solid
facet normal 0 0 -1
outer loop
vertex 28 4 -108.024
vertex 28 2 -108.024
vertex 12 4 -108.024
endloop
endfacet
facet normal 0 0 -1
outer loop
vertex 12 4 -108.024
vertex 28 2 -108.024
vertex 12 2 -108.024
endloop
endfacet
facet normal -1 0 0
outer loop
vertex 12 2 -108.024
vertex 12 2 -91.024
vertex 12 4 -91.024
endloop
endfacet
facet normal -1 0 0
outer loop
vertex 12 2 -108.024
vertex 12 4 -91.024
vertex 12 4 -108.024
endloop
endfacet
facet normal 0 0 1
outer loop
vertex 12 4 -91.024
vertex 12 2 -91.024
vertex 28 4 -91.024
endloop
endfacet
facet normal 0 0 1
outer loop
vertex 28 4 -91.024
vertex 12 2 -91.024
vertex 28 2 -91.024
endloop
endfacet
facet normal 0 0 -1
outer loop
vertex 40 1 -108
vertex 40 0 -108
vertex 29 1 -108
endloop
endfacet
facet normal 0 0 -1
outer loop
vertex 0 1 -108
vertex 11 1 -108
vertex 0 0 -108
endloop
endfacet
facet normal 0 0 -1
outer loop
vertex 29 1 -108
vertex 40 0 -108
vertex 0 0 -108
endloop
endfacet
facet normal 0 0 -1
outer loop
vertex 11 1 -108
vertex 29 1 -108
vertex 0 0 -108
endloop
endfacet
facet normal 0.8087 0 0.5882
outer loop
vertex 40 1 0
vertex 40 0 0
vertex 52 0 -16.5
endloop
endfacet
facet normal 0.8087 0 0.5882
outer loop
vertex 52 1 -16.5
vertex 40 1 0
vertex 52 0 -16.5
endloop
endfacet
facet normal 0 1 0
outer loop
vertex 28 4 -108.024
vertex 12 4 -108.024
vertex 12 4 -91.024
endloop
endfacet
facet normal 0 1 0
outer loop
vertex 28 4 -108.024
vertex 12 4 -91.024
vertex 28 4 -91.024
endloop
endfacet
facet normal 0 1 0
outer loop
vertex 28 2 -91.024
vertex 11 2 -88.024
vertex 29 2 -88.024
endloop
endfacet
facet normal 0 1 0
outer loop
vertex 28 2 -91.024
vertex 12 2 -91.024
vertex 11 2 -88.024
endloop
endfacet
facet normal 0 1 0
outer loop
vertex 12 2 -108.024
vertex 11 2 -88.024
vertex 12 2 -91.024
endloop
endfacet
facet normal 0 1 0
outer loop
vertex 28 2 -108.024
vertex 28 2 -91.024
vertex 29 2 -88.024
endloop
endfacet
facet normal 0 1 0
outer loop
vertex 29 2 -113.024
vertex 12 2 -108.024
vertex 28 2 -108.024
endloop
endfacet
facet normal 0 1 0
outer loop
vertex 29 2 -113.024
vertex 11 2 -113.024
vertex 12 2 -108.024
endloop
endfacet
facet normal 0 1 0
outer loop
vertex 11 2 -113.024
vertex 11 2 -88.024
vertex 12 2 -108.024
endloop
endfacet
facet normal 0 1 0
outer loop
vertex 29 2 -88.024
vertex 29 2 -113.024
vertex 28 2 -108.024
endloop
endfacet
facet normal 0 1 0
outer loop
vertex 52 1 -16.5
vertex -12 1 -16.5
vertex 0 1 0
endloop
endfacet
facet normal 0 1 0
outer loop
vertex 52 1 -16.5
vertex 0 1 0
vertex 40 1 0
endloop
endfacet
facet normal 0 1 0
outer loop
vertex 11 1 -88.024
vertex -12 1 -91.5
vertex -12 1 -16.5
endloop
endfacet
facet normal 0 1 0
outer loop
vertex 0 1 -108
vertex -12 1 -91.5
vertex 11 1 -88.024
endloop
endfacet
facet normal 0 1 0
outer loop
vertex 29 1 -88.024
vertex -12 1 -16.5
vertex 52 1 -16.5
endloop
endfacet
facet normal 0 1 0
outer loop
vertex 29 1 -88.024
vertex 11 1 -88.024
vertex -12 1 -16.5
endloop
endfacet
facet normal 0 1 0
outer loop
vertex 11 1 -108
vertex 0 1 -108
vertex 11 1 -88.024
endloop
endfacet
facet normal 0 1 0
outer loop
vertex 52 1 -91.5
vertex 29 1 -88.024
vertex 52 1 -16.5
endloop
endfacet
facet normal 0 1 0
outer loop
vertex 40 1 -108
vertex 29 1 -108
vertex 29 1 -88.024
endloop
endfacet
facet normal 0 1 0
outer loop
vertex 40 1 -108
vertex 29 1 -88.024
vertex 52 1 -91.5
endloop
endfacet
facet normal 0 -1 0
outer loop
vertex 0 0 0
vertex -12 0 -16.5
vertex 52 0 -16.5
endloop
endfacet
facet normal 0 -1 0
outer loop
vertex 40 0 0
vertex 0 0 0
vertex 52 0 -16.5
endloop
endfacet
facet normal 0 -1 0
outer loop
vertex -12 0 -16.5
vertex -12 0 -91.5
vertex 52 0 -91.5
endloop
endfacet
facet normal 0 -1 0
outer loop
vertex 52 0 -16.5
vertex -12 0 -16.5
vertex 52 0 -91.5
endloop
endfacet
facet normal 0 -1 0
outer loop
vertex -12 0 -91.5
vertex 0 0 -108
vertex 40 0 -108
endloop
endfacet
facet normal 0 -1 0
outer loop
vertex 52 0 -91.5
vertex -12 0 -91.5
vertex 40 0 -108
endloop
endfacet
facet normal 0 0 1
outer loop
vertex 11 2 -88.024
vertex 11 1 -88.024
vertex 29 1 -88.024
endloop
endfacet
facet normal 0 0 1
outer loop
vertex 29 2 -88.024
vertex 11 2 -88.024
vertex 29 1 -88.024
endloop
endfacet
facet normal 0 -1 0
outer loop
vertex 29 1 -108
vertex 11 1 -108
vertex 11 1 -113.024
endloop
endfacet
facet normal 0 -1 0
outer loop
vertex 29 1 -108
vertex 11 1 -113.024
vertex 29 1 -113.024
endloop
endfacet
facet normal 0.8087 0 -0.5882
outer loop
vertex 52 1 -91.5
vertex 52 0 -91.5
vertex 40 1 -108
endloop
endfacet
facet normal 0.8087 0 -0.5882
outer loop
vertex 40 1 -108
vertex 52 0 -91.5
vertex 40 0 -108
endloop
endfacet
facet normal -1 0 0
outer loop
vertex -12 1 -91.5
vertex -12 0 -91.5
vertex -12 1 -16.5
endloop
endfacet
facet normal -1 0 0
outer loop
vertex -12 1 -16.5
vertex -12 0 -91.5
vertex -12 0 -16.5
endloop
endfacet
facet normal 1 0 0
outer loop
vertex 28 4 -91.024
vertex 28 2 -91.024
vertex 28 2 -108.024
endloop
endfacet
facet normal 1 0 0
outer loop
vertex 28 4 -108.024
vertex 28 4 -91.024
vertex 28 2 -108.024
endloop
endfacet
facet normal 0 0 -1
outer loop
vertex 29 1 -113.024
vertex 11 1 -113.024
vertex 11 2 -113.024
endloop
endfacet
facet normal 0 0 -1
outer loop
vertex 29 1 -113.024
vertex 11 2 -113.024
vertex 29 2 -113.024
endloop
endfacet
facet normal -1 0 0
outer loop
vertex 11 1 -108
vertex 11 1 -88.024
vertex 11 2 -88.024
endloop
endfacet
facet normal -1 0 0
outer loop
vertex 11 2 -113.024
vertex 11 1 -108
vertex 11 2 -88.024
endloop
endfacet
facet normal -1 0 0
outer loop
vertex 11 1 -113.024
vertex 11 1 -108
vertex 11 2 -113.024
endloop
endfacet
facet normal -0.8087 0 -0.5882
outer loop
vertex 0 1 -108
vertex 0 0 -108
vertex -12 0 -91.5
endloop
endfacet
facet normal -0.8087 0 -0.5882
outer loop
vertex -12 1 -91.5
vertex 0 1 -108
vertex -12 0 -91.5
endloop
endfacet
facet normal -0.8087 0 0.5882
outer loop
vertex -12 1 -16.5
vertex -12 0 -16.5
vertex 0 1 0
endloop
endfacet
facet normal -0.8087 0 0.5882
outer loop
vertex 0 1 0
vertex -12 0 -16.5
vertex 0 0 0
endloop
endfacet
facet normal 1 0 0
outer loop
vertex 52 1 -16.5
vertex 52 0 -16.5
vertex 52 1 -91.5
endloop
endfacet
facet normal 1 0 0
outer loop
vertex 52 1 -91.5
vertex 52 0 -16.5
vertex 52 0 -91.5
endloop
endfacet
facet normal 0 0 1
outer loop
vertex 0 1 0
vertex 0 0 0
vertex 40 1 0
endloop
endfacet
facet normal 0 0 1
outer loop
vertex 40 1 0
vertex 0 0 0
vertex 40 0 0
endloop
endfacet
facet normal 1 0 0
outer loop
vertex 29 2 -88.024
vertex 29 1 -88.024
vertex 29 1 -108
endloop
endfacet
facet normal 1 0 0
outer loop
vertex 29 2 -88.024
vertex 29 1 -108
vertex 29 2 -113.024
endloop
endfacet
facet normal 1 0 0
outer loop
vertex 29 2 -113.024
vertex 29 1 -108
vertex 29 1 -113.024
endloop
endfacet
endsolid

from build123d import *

# Parameters (mm, degrees)
BOSS_EXTRUDE3_DEPTH = 1
SKETCH5_W           = 8
SKETCH5_H           = 17
BOSS_EXTRUDE4_DEPTH = 3
SKETCH6_W           = 18
SKETCH6_H           = 25
BOSS_EXTRUDE5_DEPTH = 1
SKETCH7_W           = 18
SKETCH7_H           = 5.023609272
CUT_EXTRUDE4_DEPTH  = 1


with BuildPart() as part:
    # Sketch1 → Boss-Extrude3 (new body)
    with BuildSketch(Plane(origin=(0, 0, 0), x_dir=(1, 0, 0), z_dir=(0, 1, 0))):
        Polygon((-12, 54), (20, 54), (20, 108), (11, 108), (0, 108), (-12, 91.5), align=None)
        Polygon((20, 108), (20, 54), (52, 54), (52, 91.5), (40, 108), (29, 108), align=None)
        Polygon((-12, 16.5), (0, 0), (20, 0), (20, 54), (-12, 54), align=None)
        Polygon((20, 54), (20, 0), (40, 0), (52, 16.5), (52, 54), align=None)
        Polygon((11, 108), (20, 108), (29, 108), (29, 113.023609272), (11, 113.023609272), align=None)
    extrude(amount=BOSS_EXTRUDE3_DEPTH)

    # Sketch5 → Boss-Extrude4 (add)
    with BuildSketch(Plane(origin=(0, 1, 0), x_dir=(1, 0, 0), z_dir=(0, 1, 0))):
        with Locations((16, 99.523609272)):
            Rectangle(SKETCH5_W, SKETCH5_H)
        with Locations((24, 99.523609272)):
            Rectangle(SKETCH5_W, SKETCH5_H)
    extrude(amount=BOSS_EXTRUDE4_DEPTH)

    # Sketch6 → Boss-Extrude5 (add)
    with BuildSketch(Plane(origin=(0, 1, 0), x_dir=(1, 0, 0), z_dir=(0, 1, 0))):
        with Locations((20, 100.523609272)):
            Rectangle(SKETCH6_W, SKETCH6_H)
    extrude(amount=BOSS_EXTRUDE5_DEPTH)

    # Sketch7 → Cut-Extrude4 (cut)
    with BuildSketch(Plane.XZ):
        with Locations((20, -110.511804636)):
            Rectangle(SKETCH7_W, SKETCH7_H)
    extrude(amount=-CUT_EXTRUDE4_DEPTH, mode=Mode.SUBTRACT)


solid = part.part
